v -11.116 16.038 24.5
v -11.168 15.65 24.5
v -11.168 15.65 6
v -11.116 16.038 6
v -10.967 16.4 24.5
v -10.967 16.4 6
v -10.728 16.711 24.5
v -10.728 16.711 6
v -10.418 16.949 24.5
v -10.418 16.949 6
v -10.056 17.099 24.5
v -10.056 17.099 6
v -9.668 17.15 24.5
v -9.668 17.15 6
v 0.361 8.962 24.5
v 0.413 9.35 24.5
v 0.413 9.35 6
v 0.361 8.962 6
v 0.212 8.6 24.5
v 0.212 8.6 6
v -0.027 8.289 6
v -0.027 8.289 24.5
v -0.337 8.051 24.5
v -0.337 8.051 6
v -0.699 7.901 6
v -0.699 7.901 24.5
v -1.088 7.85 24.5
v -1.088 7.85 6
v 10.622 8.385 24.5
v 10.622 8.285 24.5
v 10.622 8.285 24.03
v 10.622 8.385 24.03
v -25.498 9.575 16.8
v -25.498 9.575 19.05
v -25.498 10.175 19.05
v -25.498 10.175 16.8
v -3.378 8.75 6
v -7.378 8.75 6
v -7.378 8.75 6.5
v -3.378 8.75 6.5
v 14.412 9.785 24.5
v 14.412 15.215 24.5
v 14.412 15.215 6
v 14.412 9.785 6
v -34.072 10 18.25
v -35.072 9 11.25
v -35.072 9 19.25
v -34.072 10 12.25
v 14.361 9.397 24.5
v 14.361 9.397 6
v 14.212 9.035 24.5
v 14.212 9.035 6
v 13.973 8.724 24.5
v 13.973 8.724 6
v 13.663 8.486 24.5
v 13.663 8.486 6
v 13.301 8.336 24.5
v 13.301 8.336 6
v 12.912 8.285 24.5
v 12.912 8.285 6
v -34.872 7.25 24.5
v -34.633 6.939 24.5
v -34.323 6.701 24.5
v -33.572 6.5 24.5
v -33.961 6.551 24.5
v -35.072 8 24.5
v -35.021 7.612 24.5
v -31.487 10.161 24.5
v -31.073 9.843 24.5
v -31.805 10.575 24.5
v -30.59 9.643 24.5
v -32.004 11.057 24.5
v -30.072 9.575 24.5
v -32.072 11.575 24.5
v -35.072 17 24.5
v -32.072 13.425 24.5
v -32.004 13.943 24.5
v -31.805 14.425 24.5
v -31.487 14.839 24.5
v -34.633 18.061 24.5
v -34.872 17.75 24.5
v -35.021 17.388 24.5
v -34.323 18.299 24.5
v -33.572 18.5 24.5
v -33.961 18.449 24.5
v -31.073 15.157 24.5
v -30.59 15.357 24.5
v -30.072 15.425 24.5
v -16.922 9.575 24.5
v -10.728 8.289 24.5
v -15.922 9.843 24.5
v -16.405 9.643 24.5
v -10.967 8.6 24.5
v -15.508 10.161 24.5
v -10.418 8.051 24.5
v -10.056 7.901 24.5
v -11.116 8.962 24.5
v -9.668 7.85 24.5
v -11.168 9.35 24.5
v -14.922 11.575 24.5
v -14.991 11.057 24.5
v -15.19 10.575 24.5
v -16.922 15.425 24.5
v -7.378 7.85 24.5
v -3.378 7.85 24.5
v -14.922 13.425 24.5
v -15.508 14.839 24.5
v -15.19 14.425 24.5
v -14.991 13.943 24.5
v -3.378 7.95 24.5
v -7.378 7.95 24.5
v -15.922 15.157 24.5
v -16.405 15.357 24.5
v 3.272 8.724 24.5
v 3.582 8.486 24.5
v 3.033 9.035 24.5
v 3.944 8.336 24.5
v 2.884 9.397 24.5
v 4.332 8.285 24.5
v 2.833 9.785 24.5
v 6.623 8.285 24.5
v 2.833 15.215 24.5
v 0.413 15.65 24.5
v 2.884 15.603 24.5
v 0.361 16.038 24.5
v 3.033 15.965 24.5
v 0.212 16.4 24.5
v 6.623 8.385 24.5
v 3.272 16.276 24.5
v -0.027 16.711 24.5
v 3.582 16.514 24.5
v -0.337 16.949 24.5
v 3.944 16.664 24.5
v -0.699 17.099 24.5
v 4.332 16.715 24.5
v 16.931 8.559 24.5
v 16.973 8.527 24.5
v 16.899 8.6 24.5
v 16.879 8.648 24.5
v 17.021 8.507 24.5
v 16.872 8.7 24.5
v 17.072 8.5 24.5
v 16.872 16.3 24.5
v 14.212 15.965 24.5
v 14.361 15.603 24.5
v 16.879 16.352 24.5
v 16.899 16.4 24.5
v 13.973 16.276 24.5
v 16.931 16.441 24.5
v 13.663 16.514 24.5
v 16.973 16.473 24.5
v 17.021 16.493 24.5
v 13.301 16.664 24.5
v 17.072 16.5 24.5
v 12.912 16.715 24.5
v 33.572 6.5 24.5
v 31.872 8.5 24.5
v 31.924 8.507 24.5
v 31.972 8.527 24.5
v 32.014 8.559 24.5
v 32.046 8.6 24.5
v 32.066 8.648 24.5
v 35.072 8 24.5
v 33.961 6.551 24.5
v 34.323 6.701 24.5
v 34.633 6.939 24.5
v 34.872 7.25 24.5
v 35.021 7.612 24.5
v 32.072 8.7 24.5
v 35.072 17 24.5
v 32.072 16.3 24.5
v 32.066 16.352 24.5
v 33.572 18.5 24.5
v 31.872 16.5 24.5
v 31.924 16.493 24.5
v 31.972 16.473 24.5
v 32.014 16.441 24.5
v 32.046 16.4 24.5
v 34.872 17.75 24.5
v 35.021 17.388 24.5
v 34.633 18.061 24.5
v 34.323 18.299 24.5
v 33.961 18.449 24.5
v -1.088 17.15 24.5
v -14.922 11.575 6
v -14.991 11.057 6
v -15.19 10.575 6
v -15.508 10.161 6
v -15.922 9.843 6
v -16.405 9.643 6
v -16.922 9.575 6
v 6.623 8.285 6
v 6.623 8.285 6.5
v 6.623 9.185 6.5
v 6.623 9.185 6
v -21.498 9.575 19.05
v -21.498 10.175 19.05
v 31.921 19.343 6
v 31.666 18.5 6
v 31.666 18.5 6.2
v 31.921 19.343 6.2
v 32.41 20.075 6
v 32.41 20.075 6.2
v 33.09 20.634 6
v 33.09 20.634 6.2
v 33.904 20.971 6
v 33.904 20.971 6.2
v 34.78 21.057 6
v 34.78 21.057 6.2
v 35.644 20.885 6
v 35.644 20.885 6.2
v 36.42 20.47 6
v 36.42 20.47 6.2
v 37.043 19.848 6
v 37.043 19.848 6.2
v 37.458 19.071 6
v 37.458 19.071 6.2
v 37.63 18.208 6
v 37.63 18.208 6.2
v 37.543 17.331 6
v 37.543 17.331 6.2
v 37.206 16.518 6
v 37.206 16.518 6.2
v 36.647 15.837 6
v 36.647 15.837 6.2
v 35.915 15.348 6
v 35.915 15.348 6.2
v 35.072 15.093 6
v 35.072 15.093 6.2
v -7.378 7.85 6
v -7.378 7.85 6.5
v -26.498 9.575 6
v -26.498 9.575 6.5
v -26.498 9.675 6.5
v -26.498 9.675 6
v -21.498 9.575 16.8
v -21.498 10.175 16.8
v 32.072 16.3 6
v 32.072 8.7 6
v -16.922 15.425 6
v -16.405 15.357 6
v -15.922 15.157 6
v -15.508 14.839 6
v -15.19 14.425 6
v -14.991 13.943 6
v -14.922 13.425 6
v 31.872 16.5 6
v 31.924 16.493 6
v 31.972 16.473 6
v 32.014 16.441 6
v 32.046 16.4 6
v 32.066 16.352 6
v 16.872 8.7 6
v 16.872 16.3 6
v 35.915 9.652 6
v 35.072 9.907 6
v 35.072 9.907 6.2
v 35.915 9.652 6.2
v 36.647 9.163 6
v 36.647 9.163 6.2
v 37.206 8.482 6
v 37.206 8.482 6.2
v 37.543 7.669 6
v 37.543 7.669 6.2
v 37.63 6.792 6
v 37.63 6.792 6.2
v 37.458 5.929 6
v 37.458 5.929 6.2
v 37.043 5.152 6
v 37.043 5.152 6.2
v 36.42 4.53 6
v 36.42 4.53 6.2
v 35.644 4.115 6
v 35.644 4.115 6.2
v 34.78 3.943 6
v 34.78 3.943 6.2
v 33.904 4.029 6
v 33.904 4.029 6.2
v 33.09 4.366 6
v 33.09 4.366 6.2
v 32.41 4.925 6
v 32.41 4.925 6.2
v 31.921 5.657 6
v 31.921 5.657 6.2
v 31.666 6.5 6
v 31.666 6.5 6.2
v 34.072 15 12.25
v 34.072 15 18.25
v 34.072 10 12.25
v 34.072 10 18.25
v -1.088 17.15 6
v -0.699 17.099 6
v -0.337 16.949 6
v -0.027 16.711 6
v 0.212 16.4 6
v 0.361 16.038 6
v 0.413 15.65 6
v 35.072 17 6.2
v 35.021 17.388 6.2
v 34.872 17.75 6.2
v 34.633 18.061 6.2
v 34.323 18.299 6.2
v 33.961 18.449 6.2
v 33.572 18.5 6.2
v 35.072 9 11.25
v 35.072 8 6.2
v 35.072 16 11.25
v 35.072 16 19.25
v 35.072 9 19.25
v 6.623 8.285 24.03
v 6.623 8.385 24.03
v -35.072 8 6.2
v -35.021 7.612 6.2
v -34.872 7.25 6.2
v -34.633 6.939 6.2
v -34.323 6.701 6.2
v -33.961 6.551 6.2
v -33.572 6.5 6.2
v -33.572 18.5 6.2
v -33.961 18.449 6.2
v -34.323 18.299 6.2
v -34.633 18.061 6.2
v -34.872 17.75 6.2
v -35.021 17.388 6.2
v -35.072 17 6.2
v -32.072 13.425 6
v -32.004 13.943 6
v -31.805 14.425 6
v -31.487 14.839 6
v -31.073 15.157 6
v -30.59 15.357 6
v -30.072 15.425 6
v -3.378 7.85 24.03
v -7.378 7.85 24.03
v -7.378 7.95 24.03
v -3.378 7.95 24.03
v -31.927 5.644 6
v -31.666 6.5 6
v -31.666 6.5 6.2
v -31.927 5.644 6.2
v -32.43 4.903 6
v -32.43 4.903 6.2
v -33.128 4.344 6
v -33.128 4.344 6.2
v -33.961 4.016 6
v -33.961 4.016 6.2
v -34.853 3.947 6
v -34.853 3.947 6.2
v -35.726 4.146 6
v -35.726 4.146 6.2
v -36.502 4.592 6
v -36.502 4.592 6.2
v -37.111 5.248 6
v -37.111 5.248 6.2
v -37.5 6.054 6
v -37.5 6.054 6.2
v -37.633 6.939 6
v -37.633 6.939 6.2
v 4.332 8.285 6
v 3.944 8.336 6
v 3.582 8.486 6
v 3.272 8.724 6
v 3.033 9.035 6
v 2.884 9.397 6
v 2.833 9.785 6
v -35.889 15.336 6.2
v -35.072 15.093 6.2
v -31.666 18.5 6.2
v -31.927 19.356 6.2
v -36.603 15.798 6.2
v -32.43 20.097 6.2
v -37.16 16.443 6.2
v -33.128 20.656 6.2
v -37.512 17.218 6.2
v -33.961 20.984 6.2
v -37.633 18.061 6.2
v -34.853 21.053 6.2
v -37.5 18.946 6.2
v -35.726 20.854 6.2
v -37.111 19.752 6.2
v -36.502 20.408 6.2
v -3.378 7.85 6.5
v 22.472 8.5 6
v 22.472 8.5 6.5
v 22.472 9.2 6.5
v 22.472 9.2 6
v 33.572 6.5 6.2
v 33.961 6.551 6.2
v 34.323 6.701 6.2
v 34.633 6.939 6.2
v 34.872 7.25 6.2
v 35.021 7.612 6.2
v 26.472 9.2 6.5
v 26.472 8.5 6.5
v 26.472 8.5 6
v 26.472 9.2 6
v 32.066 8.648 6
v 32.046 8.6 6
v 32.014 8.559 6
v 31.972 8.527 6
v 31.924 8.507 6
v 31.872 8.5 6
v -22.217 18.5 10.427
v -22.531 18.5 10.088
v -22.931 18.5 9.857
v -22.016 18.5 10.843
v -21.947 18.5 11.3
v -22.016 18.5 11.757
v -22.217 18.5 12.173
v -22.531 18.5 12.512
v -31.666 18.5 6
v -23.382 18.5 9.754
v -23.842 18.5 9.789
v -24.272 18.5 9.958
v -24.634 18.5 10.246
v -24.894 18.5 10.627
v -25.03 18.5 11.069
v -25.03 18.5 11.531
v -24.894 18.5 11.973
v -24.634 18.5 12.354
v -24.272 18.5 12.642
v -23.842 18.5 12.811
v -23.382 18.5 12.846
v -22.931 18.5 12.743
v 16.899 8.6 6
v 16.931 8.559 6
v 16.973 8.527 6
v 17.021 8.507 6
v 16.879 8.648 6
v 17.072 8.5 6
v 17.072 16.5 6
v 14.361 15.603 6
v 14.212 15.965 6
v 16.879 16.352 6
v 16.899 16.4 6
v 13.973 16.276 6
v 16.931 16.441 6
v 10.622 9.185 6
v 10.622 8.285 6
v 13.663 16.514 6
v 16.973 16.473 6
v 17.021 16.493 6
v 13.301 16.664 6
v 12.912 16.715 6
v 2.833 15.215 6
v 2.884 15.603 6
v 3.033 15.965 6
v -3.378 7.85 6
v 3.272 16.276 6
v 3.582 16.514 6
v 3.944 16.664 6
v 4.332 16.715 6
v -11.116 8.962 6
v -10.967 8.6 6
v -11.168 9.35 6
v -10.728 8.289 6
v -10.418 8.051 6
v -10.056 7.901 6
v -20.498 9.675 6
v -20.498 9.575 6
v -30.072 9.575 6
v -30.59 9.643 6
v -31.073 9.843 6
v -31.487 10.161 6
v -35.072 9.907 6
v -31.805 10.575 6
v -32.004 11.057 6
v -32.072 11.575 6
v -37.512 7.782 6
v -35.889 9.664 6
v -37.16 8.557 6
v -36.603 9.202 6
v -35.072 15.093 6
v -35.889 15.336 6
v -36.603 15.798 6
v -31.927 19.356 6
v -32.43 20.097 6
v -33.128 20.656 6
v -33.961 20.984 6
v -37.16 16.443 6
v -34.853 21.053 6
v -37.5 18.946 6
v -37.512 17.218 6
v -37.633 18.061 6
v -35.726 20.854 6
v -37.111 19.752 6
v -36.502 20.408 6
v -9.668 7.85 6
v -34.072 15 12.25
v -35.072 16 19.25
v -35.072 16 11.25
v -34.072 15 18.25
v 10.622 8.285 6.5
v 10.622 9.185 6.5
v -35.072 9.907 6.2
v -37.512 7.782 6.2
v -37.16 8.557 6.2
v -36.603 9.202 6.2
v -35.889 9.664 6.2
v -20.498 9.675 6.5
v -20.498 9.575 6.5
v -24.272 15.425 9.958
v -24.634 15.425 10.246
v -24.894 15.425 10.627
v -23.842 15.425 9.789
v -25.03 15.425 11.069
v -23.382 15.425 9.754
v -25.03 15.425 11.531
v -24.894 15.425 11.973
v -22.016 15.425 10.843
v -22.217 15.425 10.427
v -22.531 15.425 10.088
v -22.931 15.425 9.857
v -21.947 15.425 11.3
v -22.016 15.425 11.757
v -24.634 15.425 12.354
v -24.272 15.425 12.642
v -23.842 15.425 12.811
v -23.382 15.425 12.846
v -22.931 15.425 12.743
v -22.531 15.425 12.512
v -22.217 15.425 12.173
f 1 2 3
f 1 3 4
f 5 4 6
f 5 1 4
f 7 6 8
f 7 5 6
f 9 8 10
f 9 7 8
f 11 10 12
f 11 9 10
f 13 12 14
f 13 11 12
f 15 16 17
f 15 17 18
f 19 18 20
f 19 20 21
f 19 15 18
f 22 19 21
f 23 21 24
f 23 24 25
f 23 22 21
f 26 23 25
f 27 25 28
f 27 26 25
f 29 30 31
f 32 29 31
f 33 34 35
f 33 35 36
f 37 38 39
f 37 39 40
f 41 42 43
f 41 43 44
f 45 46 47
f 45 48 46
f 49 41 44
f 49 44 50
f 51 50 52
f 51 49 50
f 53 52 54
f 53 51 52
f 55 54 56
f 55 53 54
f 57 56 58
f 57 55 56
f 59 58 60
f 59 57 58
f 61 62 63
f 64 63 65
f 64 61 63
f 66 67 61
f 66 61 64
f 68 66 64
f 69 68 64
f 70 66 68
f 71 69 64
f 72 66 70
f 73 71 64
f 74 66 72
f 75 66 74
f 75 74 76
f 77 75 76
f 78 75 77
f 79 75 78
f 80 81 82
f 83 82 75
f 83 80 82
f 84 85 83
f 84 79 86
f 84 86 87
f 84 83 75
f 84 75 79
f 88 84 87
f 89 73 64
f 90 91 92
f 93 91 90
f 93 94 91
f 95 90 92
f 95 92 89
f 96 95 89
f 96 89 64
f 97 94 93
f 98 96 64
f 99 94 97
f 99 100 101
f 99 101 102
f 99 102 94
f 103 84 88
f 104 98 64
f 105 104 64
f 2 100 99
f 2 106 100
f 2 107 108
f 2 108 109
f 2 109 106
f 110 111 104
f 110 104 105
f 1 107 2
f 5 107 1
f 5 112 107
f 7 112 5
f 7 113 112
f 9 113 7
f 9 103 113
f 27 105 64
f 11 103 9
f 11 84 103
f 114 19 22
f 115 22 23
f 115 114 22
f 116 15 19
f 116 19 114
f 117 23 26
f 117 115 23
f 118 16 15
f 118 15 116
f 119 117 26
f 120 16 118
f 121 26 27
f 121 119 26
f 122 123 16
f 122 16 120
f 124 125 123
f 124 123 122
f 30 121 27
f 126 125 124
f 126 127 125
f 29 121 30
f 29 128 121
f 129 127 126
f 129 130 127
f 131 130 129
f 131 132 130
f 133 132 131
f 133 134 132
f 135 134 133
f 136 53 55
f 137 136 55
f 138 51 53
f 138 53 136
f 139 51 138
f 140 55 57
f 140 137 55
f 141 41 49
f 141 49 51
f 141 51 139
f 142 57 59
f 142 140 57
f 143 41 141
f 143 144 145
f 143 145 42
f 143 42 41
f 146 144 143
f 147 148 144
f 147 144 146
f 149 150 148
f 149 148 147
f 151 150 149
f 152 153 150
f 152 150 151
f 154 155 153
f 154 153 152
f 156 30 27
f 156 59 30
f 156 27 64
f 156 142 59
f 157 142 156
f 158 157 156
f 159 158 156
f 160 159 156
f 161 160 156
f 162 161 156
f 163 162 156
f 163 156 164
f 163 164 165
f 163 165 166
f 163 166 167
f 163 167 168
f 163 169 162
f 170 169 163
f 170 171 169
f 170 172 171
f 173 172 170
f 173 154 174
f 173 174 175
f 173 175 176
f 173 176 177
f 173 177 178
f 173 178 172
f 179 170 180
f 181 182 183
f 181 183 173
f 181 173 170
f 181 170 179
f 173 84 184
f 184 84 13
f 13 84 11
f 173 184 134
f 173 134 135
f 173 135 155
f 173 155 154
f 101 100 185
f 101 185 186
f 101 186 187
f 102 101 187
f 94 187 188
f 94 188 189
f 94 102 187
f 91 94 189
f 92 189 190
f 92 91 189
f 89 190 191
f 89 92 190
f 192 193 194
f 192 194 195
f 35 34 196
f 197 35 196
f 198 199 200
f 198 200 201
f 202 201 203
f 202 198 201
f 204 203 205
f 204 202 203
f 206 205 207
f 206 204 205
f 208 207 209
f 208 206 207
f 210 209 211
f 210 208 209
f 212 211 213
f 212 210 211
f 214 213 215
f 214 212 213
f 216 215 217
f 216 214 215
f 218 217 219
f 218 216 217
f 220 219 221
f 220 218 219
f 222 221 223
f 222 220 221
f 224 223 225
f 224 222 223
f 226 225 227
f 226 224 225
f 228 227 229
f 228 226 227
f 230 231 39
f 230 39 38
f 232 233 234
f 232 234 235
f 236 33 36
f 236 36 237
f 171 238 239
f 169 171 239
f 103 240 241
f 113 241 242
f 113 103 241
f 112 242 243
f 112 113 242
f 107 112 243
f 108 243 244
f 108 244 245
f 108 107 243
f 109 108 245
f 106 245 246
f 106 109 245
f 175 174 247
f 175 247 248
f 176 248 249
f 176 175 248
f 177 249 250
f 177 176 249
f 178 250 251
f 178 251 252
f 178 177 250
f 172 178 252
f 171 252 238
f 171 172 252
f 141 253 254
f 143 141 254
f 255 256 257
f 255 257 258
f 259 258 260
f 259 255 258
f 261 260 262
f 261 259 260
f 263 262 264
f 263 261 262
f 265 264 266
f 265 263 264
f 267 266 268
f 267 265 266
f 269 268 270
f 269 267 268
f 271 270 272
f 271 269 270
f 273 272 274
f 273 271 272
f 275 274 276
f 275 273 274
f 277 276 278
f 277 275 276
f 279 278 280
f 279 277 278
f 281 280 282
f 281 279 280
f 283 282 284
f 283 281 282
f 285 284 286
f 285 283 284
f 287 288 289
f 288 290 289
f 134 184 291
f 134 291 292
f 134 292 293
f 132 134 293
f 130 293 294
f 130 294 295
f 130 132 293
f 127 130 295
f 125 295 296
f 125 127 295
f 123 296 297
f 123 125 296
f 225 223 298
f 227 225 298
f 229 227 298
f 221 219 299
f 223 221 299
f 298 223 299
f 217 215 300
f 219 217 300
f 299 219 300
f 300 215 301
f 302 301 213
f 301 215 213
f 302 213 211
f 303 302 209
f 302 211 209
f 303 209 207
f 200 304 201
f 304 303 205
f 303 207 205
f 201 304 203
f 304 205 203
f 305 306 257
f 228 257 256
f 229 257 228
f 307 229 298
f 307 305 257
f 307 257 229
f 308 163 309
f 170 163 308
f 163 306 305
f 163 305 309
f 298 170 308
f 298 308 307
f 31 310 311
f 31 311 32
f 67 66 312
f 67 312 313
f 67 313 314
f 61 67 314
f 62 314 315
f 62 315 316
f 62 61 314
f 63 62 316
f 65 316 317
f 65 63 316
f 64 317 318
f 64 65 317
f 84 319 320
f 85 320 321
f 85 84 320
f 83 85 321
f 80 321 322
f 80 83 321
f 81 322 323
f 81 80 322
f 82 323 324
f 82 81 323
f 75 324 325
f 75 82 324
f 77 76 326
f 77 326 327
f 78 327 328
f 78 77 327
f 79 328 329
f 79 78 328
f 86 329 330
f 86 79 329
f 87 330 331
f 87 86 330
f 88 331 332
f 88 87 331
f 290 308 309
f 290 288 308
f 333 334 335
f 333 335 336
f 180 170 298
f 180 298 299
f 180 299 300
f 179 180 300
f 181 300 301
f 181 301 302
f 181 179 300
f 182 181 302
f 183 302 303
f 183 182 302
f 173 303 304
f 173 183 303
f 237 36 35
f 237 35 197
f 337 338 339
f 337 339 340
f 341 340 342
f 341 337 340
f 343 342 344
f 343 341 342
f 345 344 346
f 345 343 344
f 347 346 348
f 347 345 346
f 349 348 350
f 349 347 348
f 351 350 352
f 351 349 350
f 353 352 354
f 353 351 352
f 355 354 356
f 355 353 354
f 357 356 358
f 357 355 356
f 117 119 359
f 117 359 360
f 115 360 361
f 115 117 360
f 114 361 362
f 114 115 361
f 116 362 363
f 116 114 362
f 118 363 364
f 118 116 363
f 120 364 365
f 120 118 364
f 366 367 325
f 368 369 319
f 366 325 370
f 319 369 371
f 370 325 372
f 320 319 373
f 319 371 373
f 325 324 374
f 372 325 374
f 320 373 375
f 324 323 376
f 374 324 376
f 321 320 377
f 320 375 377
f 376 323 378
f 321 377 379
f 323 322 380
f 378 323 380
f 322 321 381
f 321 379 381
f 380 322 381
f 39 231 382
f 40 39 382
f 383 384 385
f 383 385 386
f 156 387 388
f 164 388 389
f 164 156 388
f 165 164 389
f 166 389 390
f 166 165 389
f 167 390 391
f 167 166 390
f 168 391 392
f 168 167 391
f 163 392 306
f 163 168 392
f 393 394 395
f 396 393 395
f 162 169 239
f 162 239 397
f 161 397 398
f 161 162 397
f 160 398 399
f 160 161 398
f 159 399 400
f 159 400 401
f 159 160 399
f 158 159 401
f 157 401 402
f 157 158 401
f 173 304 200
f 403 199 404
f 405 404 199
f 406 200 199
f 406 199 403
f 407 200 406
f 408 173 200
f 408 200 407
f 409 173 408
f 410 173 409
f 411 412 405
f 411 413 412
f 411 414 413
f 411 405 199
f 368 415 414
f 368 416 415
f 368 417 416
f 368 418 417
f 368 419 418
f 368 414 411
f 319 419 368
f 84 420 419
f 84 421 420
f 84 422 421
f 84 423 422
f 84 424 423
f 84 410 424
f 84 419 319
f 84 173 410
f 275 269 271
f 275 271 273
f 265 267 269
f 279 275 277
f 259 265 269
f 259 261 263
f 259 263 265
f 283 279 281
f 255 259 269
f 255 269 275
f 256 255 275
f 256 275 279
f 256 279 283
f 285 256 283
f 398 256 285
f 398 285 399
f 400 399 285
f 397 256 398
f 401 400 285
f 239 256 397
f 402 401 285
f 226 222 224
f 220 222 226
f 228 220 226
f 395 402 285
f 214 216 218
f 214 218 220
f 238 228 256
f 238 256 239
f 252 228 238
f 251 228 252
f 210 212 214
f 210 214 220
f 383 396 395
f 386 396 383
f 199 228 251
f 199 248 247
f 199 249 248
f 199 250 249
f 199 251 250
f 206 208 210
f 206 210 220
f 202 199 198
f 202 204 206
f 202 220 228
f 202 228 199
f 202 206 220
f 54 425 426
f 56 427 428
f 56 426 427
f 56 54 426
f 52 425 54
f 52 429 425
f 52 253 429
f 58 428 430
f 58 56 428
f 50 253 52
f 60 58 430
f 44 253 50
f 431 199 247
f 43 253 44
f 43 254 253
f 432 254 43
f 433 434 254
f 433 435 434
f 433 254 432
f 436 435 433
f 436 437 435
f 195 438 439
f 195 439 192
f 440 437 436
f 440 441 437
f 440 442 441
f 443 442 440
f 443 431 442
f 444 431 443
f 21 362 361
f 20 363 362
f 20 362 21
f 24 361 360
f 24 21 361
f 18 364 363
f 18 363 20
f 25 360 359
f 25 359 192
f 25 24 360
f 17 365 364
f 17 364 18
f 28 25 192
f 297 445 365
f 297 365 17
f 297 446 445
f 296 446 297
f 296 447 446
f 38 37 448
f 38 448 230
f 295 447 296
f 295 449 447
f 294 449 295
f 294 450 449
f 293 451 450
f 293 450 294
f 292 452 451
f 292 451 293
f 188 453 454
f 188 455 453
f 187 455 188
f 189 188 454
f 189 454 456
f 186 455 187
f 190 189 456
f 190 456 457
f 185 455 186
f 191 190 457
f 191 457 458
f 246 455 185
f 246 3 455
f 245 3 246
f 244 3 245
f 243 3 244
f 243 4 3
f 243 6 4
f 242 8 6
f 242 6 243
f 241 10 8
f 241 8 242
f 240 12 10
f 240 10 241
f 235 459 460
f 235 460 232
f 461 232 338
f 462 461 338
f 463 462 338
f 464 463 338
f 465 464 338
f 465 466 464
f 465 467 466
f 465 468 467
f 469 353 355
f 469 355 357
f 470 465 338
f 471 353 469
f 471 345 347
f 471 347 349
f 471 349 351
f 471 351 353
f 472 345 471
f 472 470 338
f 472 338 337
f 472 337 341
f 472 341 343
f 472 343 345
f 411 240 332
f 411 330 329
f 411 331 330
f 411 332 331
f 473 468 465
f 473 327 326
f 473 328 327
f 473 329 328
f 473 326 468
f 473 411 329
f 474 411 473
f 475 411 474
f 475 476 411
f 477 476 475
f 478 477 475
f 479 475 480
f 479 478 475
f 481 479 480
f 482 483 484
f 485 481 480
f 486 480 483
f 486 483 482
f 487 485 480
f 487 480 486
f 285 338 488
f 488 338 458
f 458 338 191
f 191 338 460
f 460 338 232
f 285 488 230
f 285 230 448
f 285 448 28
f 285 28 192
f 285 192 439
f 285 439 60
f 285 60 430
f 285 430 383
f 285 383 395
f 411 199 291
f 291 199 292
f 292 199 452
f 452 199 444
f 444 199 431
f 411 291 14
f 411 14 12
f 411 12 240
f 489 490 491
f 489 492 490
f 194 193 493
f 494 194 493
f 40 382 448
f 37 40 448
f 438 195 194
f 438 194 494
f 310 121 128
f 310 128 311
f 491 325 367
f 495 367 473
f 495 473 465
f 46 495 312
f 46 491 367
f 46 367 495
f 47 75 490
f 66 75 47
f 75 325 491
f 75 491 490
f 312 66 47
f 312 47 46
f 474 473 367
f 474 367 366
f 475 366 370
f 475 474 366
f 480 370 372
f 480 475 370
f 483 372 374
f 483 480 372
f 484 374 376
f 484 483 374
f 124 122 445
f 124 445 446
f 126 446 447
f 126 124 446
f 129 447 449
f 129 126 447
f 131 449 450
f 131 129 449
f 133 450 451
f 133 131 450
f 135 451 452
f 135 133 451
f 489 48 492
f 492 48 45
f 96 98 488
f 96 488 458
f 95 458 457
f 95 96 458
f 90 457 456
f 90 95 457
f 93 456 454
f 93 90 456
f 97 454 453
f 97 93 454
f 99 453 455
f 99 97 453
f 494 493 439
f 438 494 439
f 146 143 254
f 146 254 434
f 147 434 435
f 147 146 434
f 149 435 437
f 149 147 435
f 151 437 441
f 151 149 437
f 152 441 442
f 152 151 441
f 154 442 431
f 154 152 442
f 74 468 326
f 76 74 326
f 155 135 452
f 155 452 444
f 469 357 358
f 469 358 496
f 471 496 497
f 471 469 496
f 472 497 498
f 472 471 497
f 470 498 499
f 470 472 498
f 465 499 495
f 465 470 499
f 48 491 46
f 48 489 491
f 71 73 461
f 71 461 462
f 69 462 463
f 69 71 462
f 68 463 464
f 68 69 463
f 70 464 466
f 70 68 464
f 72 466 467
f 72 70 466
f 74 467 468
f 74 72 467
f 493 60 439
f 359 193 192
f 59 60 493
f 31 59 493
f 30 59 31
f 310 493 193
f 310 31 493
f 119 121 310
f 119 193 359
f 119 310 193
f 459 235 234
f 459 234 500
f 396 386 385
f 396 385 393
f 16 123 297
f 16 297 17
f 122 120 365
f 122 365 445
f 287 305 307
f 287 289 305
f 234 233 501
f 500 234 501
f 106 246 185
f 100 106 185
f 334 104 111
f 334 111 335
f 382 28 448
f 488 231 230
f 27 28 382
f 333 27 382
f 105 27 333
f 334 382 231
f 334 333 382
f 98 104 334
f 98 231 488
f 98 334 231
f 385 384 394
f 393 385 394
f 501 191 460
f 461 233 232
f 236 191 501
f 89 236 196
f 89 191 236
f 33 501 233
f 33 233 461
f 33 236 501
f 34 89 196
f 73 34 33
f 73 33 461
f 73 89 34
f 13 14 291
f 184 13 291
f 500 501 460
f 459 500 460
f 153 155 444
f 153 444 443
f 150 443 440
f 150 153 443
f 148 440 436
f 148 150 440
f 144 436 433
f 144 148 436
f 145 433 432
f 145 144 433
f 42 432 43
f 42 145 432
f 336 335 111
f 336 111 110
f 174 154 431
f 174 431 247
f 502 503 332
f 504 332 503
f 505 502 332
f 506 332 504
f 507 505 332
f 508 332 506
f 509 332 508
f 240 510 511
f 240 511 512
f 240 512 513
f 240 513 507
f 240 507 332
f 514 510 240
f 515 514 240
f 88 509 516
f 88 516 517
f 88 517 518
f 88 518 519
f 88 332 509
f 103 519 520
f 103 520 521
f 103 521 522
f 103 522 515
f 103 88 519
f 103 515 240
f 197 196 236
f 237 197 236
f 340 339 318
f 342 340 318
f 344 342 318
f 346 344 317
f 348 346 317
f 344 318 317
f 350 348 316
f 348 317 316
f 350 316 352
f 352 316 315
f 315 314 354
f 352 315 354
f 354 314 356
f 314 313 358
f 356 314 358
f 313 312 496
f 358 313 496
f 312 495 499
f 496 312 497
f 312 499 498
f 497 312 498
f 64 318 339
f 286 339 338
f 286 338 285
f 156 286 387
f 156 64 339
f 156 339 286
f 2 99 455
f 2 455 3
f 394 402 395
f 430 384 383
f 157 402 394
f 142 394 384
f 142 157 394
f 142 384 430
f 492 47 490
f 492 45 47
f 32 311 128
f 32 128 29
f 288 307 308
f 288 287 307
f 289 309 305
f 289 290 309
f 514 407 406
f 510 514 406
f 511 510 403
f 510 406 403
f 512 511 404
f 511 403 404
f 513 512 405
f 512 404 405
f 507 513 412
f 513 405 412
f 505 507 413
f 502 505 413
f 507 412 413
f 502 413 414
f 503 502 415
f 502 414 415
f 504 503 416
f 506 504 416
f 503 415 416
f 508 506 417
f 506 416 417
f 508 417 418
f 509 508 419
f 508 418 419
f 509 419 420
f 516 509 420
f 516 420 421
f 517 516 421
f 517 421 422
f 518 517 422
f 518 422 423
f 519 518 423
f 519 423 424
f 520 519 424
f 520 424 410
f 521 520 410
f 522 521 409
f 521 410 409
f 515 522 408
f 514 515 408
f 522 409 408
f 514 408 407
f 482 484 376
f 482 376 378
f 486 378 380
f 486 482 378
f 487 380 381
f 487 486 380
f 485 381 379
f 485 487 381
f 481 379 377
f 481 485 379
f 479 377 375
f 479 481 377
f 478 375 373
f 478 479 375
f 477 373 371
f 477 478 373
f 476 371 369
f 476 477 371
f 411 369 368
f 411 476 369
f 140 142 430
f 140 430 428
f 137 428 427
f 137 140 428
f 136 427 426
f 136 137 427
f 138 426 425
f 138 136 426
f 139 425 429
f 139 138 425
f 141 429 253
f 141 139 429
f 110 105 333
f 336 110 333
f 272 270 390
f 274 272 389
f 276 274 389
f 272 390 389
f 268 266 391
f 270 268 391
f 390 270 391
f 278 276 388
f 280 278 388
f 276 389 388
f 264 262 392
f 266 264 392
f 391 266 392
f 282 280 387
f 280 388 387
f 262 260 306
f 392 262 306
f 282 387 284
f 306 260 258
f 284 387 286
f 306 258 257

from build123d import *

# Parameters (mm, degrees)
F2_DEPTH  = 18.5
F3_R      = 1.55
F4_DEPTH  = 3.075
F5_W      = 6
F5_H      = 0.5
F6_DEPTH  = 0.1
F5_W_2    = 4
F5_H_2    = 2.25
F7_DEPTH  = 0.6
F8_W      = 4
F8_H      = 0.5
F9_DEPTH  = 0.9
F8_H_2    = 0.47
F10_DEPTH = 0.1
F11_W     = 4
F11_H     = 0.5
F12_DEPTH = 0.9
F11_H_2   = 0.47
F13_DEPTH = 0.1
F14_W     = 4
F14_H     = 0.5
F15_DEPTH = 0.7
F16_W     = 8
F16_H     = 7
F17_DEPTH = 1
F17_TAPER = 45
F18_W     = 8
F18_H     = 7
F19_DEPTH = 1
F19_TAPER = 45
F22_DEPTH = 0.2
F23_ANGLE = 90


with BuildPart() as f2:
    # F1 (on Front) → F2 (new body)
    with BuildSketch(Plane.XZ):
        with BuildLine():
            Line((-33.5725, -6), (33.5725, -6))
            ThreePointArc((33.5725, -6), (34.6331601718, -5.5606601718), (35.0725, -4.5))
            Line((35.0725, -4.5), (35.0725, 4.5))
            ThreePointArc((35.0725, 4.5), (34.6331601718, 5.5606601718), (33.5725, 6))
            Line((33.5725, 6), (-33.5725, 6))
            ThreePointArc((-33.5725, 6), (-34.6331601718, 5.5606601718), (-35.0725, 4.5))
            Line((-35.0725, 4.5), (-35.0725, -4.5))
            ThreePointArc((-35.0725, -4.5), (-34.6331601718, -5.5606601718), (-33.5725, -6))
        make_face()
        with BuildLine():
            ThreePointArc((-14.9225, -0.925), (-15.5082864376, -2.3392135624), (-16.9225, -2.925))
            Line((-16.9225, -2.925), (-30.0725, -2.925))
            ThreePointArc((-30.0725, -2.925), (-31.4867135624, -2.3392135624), (-32.0725, -0.925))
            Line((-32.0725, -0.925), (-32.0725, 0.925))
            ThreePointArc((-32.0725, 0.925), (-31.4867135624, 2.3392135624), (-30.0725, 2.925))
            Line((-30.0725, 2.925), (-16.9225, 2.925))
            ThreePointArc((-16.9225, 2.925), (-15.5082864376, 2.3392135624), (-14.9225, 0.925))
            Line((-14.9225, 0.925), (-14.9225, -0.925))
        make_face(mode=Mode.SUBTRACT)
        with BuildLine():
            Line((-9.6675, 4.65), (-1.0875, 4.65))
            ThreePointArc((-1.0875, 4.65), (-0.0268398282, 4.2106601718), (0.4125, 3.15))
            Line((0.4125, 3.15), (0.4125, -3.15))
            ThreePointArc((0.4125, -3.15), (-0.0268398282, -4.2106601718), (-1.0875, -4.65))
            Line((-1.0875, -4.65), (-9.6675, -4.65))
            ThreePointArc((-9.6675, -4.65), (-10.7281601718, -4.2106601718), (-11.1675, -3.15))
            Line((-11.1675, -3.15), (-11.1675, 3.15))
            ThreePointArc((-11.1675, 3.15), (-10.7281601718, 4.2106601718), (-9.6675, 4.65))
        make_face(mode=Mode.SUBTRACT)
        with BuildLine():
            Line((4.3325, 4.215), (12.9125, 4.215))
            ThreePointArc((12.9125, 4.215), (13.9731601718, 3.7756601718), (14.4125, 2.715))
            Line((14.4125, 2.715), (14.4125, -2.715))
            ThreePointArc((14.4125, -2.715), (13.9731601718, -3.7756601718), (12.9125, -4.215))
            Line((12.9125, -4.215), (4.3325, -4.215))
            ThreePointArc((4.3325, -4.215), (3.2718398282, -3.7756601718), (2.8325, -2.715))
            Line((2.8325, -2.715), (2.8325, 2.715))
            ThreePointArc((2.8325, 2.715), (3.2718398282, 3.7756601718), (4.3325, 4.215))
        make_face(mode=Mode.SUBTRACT)
        with BuildLine():
            ThreePointArc((32.0725, -3.8), (32.0139213562, -3.9414213562), (31.8725, -4))
            Line((31.8725, -4), (17.0725, -4))
            ThreePointArc((17.0725, -4), (16.9310786438, -3.9414213562), (16.8725, -3.8))
            Line((16.8725, -3.8), (16.8725, 3.8))
            ThreePointArc((16.8725, 3.8), (16.9310786438, 3.9414213562), (17.0725, 4))
            Line((17.0725, 4), (31.8725, 4))
            ThreePointArc((31.8725, 4), (32.0139213562, 3.9414213562), (32.0725, 3.8))
            Line((32.0725, 3.8), (32.0725, -3.8))
        make_face(mode=Mode.SUBTRACT)
    extrude(amount=-F2_DEPTH)

    # F3 (on face) → F4 (cut, through all)
    with BuildSketch(Plane.XY.offset(6)):
        with Locations((-23.4975, 13.2)):
            Circle(F3_R)
    extrude(amount=-F4_DEPTH, mode=Mode.SUBTRACT)

    # F5 (on face) → F6 (join)
    with BuildSketch(Plane.XY.offset(-2.925)):
        with Locations((-23.4975, 18.25)):
            Rectangle(F5_W, F5_H)
    extrude(amount=F6_DEPTH)

    # F5 (on face) → F7 (join)
    with BuildSketch(Plane.XY.offset(-2.925)):
        with Locations((-23.4975, 6.575)):
            Rectangle(F5_W_2, F5_H_2)
    extrude(amount=F7_DEPTH)

    # F8 (on face) → F9 (join)
    with BuildSketch(Plane.XY.offset(-4.65)):
        with Locations((-5.3775, 18.25)):
            Rectangle(F8_W, F8_H)
    extrude(amount=F9_DEPTH)

    # F8 (on face) → F10 (join)
    with BuildSketch(Plane.XY.offset(-4.65)):
        with Locations((-5.3775, 0.235)):
            Rectangle(F8_W, F8_H_2)
    extrude(amount=F10_DEPTH)

    # F11 (on face) → F12 (join)
    with BuildSketch(Plane.XY.offset(-4.215)):
        with Locations((8.6225, 18.25)):
            Rectangle(F11_W, F11_H)
    extrude(amount=F12_DEPTH)

    # F11 (on face) → F13 (join)
    with BuildSketch(Plane.XY.offset(-4.215)):
        with Locations((8.6225, 0.235)):
            Rectangle(F11_W, F11_H_2)
    extrude(amount=F13_DEPTH)

    # F14 (on face) → F15 (join)
    with BuildSketch(Plane.XY.offset(-4)):
        with Locations((24.4725, 18.25)):
            Rectangle(F14_W, F14_H)
    extrude(amount=F15_DEPTH)

    # F16 (on face) → F17 (cut)
    with BuildSketch(Plane.YZ.offset(35.0725)):
        with Locations((9.25, 0)):
            Rectangle(F16_W, F16_H)
    extrude(amount=-F17_DEPTH, taper=F17_TAPER, mode=Mode.SUBTRACT)

    # F18 (on face) → F19 (cut)
    with BuildSketch(Plane(origin=(-35.0725, 0, 0), x_dir=(0, -1, 0), z_dir=(-1, 0, 0))):
        with Locations((-9.25, 0)):
            Rectangle(F18_W, F18_H)
    extrude(amount=-F19_DEPTH, taper=F19_TAPER, mode=Mode.SUBTRACT)

    # F21 (on face) → F22 (join)
    with BuildSketch(Plane(origin=(0, 18.5, 0), x_dir=(-1, 0, 0), z_dir=(0, 1, 0))):
        with BuildLine():
            Line((-33.5725, 6), (-31.6655044446, 6))
            ThreePointArc((-31.6655044446, 6), (-36.7544805153, 7.6819805153), (-35.0725, 2.5930044446))
            Line((-35.0725, 2.5930044446), (-35.0725, 4.5))
            ThreePointArc((-35.0725, 4.5), (-34.6331601718, 5.5606601718), (-33.5725, 6))
        make_face()
        with BuildLine():
            Line((-35.0725, -4.5), (-35.0725, -2.5930044446))
            ThreePointArc((-35.0725, -2.5930044446), (-36.7544805153, -7.6819805153), (-31.6655044446, -6))
            Line((-31.6655044446, -6), (-33.5725, -6))
            ThreePointArc((-33.5725, -6), (-34.6331601718, -5.5606601718), (-35.0725, -4.5))
        make_face()
        with BuildLine():
            ThreePointArc((37.6331601718, 5.5606601718), (34.8534245792, 8.5525631767), (31.6655044446, 6))
            Line((31.6655044446, 6), (33.5725, 6))
            ThreePointArc((33.5725, 6), (34.6331601718, 5.5606601718), (35.0725, 4.5))
            Line((35.0725, 4.5), (35.0725, 2.5930044446))
            ThreePointArc((35.0725, 2.5930044446), (36.9045055313, 3.6008157245), (37.6331601718, 5.5606601718))
        make_face()
        with BuildLine():
            ThreePointArc((37.6331601718, -5.5606601718), (36.9045055313, -3.6008157245), (35.0725, -2.5930044446))
            Line((35.0725, -2.5930044446), (35.0725, -4.5))
            ThreePointArc((35.0725, -4.5), (34.6331601718, -5.5606601718), (33.5725, -6))
            Line((33.5725, -6), (31.6655044446, -6))
            ThreePointArc((31.6655044446, -6), (34.8534245792, -8.5525631767), (37.6331601718, -5.5606601718))
        make_face()
    extrude(amount=-F22_DEPTH)


with BuildPart() as f2_1:
    # F23: moved
    add(f2.part.rotate(Axis((0, 18.5, 6), (-1, 0, 0)), F23_ANGLE))


solid = f2_1.part
